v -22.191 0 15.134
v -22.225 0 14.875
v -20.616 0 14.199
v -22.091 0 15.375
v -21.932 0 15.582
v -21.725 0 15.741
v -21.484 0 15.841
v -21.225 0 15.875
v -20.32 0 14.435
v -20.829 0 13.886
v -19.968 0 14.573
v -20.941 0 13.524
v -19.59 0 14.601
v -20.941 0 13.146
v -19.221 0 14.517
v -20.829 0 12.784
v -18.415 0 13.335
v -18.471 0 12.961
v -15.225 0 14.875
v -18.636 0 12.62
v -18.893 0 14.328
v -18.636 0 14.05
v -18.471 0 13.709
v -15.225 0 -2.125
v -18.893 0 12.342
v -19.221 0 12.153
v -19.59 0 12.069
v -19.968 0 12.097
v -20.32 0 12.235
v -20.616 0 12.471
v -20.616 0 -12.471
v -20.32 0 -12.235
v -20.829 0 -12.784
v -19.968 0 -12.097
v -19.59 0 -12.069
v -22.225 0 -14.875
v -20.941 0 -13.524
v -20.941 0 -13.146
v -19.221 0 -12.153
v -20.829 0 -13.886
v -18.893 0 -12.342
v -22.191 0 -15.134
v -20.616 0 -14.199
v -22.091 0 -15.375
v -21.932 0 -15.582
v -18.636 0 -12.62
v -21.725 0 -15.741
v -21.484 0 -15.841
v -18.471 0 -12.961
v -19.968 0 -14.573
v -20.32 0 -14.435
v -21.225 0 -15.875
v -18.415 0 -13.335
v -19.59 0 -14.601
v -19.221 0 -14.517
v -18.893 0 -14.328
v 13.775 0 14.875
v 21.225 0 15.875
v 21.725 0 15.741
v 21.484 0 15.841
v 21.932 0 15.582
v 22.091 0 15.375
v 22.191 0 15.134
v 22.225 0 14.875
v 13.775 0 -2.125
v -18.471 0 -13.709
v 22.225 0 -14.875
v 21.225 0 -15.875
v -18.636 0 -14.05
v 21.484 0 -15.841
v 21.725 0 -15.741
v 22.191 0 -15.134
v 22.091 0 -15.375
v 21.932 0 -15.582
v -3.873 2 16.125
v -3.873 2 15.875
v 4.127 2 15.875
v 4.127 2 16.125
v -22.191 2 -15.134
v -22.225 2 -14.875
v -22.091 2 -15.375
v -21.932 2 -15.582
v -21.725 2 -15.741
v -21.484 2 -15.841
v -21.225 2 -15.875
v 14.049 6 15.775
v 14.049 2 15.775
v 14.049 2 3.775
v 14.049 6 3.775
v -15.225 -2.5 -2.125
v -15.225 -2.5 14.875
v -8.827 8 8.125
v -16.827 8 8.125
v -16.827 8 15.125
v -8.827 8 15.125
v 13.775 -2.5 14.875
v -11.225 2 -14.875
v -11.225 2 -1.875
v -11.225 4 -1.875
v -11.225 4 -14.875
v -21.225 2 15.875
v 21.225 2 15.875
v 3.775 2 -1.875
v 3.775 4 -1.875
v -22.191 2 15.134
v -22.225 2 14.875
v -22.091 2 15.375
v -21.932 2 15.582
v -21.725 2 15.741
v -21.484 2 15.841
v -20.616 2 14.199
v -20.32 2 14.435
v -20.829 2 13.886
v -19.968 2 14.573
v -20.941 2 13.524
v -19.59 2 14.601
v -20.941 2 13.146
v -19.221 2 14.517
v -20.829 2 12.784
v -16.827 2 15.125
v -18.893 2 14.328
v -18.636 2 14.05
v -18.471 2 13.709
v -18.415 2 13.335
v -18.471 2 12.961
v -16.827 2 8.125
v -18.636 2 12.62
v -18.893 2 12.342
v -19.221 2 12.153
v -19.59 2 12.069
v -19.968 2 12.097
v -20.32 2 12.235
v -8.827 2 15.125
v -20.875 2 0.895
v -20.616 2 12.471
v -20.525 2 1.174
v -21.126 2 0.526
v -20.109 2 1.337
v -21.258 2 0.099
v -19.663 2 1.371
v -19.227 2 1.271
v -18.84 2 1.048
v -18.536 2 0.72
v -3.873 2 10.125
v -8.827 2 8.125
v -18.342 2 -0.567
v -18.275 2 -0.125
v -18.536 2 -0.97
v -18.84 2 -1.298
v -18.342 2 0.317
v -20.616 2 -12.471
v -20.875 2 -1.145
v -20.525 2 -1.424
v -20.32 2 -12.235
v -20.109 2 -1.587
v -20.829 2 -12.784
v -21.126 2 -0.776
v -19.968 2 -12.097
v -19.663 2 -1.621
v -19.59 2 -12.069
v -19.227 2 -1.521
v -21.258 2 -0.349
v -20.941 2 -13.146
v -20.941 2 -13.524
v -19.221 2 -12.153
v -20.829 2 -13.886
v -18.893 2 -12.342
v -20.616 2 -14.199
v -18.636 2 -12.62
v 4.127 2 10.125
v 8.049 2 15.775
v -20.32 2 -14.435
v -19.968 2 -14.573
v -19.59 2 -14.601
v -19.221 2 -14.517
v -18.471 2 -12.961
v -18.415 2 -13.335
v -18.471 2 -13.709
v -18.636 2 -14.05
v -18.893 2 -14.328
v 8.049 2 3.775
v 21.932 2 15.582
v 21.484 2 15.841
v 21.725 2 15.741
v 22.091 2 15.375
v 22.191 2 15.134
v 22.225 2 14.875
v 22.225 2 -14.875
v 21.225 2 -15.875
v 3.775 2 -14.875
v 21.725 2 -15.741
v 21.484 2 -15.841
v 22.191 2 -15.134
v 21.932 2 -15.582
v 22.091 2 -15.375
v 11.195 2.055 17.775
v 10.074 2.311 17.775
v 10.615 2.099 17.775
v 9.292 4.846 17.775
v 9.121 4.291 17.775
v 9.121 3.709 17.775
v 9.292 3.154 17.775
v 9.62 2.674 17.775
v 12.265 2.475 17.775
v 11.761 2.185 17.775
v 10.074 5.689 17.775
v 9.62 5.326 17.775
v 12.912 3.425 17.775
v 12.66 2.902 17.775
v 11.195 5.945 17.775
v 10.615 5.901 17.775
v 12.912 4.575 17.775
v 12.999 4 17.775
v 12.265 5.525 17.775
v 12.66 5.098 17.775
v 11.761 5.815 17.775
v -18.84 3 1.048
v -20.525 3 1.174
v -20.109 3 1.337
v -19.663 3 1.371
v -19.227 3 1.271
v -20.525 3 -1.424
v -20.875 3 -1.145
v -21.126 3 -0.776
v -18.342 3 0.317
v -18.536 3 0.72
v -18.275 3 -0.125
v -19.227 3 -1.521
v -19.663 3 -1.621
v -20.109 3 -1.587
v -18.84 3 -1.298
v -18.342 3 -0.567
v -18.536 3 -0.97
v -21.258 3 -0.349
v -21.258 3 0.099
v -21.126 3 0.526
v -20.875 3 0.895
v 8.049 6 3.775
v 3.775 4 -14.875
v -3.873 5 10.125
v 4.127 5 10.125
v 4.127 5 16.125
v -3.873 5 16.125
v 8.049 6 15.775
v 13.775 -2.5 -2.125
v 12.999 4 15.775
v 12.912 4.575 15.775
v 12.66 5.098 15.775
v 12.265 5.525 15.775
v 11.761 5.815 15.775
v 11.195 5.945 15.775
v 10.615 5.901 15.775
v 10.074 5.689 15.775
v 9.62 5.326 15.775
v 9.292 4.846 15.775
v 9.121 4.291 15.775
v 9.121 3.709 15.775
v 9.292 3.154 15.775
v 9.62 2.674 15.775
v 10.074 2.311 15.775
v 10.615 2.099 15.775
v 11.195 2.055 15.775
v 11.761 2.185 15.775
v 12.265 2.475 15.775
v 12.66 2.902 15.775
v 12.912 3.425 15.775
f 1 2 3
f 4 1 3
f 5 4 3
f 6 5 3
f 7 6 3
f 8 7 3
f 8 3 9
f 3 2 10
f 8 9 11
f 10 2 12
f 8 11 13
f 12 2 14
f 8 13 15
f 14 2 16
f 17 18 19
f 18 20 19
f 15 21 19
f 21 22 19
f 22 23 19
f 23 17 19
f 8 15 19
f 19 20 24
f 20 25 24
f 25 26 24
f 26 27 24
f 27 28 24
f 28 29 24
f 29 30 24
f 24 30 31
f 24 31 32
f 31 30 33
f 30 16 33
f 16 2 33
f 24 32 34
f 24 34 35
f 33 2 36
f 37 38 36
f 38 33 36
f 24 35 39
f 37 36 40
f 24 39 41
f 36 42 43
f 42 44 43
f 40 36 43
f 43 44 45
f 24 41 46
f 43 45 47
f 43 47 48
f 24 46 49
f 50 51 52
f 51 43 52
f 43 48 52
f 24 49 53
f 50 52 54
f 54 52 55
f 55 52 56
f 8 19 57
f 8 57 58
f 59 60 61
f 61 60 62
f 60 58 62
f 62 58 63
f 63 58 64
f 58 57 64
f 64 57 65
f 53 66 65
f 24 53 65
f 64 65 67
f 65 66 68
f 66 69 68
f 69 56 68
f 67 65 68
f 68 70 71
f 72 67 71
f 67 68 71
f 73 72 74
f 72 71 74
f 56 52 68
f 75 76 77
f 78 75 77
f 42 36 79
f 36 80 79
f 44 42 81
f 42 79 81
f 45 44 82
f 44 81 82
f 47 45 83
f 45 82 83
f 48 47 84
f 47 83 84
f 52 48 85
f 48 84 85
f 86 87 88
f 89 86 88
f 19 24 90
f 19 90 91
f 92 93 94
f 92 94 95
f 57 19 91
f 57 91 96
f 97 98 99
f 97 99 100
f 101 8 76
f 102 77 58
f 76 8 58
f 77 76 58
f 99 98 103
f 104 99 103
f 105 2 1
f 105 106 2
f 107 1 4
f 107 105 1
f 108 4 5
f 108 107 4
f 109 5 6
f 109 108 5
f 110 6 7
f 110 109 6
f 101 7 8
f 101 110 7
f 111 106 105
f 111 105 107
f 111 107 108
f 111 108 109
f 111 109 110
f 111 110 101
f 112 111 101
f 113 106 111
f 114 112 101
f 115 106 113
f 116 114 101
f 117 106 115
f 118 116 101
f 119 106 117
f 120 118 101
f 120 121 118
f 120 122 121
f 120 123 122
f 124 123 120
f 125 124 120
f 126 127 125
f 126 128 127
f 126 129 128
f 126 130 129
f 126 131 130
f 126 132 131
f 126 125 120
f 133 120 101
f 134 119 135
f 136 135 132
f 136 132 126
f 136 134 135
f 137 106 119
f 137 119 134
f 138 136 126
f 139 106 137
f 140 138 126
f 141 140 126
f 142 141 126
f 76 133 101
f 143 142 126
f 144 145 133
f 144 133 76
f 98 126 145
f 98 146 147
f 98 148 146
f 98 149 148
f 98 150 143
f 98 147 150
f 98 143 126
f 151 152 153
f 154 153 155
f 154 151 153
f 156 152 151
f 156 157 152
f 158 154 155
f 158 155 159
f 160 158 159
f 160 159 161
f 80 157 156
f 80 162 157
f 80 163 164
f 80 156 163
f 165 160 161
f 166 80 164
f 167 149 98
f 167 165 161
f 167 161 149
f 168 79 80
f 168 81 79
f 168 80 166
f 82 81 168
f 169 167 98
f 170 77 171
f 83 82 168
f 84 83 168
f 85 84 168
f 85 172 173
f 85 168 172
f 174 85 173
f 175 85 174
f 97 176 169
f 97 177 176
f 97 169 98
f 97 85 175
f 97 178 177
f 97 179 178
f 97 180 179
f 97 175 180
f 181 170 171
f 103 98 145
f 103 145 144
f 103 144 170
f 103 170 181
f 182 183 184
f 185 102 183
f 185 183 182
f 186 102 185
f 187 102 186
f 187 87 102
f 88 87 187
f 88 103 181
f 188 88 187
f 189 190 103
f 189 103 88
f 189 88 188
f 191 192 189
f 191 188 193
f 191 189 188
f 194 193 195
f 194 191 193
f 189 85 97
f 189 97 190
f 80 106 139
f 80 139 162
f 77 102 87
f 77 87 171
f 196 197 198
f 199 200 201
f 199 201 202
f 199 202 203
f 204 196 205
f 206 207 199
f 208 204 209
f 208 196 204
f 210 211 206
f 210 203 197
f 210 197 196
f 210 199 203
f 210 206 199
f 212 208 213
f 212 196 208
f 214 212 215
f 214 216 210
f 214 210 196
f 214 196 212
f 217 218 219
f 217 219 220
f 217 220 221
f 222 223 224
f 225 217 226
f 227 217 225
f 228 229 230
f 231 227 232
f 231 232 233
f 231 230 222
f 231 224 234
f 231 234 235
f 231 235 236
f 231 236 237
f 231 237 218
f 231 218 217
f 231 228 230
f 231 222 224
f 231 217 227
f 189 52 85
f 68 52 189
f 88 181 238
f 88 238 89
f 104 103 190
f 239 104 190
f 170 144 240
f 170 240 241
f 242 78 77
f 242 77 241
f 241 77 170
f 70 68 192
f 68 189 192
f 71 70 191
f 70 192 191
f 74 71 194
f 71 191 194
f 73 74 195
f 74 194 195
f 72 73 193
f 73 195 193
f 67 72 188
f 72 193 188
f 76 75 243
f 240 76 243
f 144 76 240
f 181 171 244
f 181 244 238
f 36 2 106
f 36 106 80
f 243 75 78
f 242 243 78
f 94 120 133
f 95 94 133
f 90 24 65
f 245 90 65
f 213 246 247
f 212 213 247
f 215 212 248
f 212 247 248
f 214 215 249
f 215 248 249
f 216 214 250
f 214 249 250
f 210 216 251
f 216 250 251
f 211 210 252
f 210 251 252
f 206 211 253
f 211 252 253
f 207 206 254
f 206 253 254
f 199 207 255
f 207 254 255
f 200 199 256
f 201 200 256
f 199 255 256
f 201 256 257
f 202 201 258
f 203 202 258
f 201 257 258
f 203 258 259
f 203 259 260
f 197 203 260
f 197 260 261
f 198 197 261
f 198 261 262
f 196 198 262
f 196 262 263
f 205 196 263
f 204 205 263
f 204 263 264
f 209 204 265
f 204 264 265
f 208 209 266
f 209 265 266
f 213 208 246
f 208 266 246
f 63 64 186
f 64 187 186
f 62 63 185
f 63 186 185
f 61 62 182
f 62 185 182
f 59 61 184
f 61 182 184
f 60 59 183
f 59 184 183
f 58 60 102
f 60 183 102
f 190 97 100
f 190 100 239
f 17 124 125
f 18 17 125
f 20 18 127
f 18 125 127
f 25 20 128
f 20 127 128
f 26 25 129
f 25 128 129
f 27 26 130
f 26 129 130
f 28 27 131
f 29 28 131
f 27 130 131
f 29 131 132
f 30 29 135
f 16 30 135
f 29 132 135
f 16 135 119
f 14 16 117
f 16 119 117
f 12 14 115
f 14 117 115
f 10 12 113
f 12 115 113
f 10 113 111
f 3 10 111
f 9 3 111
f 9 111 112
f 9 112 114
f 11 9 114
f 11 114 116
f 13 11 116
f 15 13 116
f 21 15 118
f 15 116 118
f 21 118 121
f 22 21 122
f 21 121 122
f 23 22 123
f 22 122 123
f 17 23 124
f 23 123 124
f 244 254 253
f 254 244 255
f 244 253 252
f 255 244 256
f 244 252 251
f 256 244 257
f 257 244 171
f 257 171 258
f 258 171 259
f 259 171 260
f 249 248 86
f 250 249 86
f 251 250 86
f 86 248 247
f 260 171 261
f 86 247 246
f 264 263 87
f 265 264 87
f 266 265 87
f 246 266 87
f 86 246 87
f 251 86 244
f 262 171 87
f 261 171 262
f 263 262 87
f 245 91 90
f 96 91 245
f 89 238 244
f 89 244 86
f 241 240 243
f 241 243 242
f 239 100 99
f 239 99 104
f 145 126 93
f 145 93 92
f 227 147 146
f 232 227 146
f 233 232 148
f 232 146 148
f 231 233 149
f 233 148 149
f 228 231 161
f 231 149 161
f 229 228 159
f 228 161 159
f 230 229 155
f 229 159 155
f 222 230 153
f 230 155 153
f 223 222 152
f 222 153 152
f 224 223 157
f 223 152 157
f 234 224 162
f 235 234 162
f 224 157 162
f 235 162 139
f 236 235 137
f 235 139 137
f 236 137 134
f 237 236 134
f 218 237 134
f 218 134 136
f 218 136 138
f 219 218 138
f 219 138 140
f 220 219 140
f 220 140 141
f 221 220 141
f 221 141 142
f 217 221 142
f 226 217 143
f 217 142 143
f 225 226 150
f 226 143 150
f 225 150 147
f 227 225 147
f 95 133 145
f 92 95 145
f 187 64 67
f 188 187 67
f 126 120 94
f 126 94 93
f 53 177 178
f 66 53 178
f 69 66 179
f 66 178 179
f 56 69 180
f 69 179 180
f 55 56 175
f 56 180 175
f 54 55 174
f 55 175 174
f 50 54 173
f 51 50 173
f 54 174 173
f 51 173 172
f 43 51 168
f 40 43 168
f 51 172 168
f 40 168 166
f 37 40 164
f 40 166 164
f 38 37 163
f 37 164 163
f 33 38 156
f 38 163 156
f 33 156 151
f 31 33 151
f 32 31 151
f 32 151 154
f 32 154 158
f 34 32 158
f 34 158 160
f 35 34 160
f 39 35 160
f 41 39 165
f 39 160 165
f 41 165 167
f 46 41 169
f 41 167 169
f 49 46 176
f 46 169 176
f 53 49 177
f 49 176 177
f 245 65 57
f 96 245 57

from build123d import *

# Parameters (mm, degrees)
SKETCH1_W           = 44.45
SKETCH1_H           = 31.75
BOSS_EXTRUDE1_DEPTH = 2
SKETCH2_R           = 1.27
CUT_EXTRUDE1_DEPTH  = 2
FILLET1_R           = 1
FILLET2_R           = 1
FILLET3_R           = 1
FILLET4_R           = 1
SKETCH3_W           = 8
SKETCH3_H           = 7
BOSS_EXTRUDE2_DEPTH = 6
SKETCH4_W           = 8
SKETCH4_H           = 6
BOSS_EXTRUDE3_DEPTH = 3
SKETCH5_W           = 6
SKETCH5_H           = 12
BOSS_EXTRUDE4_DEPTH = 4
SKETCH6_R           = 1.95
BOSS_EXTRUDE5_DEPTH = 2
SKETCH7_R           = 1.5
BOSS_EXTRUDE6_DEPTH = 1
SKETCH9_W           = 15
SKETCH9_H           = 13
BOSS_EXTRUDE7_DEPTH = 2
SKETCH10_W          = 29
SKETCH10_H          = 17
BOSS_EXTRUDE8_DEPTH = 2.5


with BuildPart() as part:
    # Sketch1 → Boss-Extrude1 (new body)
    with BuildSketch(Plane(origin=(0, 0, 0), x_dir=(1, 0, 0), z_dir=(0, 1, 0))):
        Rectangle(SKETCH1_W, SKETCH1_H)
    extrude(amount=BOSS_EXTRUDE1_DEPTH)

    # Sketch2 → Cut-Extrude1 (cut)
    with BuildSketch(Plane(origin=(0, 2, 0), x_dir=(1, 0, 0), z_dir=(0, 1, 0))):
        with Locations((-19.685, -13.335)):
            Circle(SKETCH2_R)
        with Locations((-19.685, 13.335)):
            Circle(SKETCH2_R)
    extrude(amount=-CUT_EXTRUDE1_DEPTH, mode=Mode.SUBTRACT)

    # Fillet1
    fillet1_edges = [part.edges().sort_by_distance(p)[0] for p in [
        (-22.225, 1, -15.875),
    ]]
    fillet(fillet1_edges, radius=FILLET1_R)

    # Fillet2
    fillet2_edges = [part.edges().sort_by_distance(p)[0] for p in [
        (-22.225, 1, 15.875),
    ]]
    fillet(fillet2_edges, radius=FILLET2_R)

    # Fillet3
    fillet3_edges = [part.edges().sort_by_distance(p)[0] for p in [
        (22.225, 1, -15.875),
    ]]
    fillet(fillet3_edges, radius=FILLET3_R)

    # Fillet4
    fillet4_edges = [part.edges().sort_by_distance(p)[0] for p in [
        (22.225, 1, 15.875),
    ]]
    fillet(fillet4_edges, radius=FILLET4_R)

    # Sketch3 → Boss-Extrude2 (add)
    with BuildSketch(Plane(origin=(0, 2, 0), x_dir=(1, 0, 0), z_dir=(0, 1, 0))):
        with Locations((-12.827, -11.625)):
            Rectangle(SKETCH3_W, SKETCH3_H)
    extrude(amount=BOSS_EXTRUDE2_DEPTH)

    # Sketch4 → Boss-Extrude3 (add)
    with BuildSketch(Plane(origin=(0, 2, 0), x_dir=(1, 0, 0), z_dir=(0, 1, 0))):
        with Locations((0.127, -13.125)):
            Rectangle(SKETCH4_W, SKETCH4_H)
    extrude(amount=BOSS_EXTRUDE3_DEPTH)

    # Sketch5 → Boss-Extrude4 (add)
    with BuildSketch(Plane(origin=(0, 2, 0), x_dir=(1, 0, 0), z_dir=(0, 1, 0))):
        with Locations((11.049, -9.775)):
            Rectangle(SKETCH5_W, SKETCH5_H)
    extrude(amount=BOSS_EXTRUDE4_DEPTH)

    # Sketch6 → Boss-Extrude5 (add)
    with BuildSketch(Plane.XY.offset(15.775)):
        with Locations((11.049, 4)):
            Circle(SKETCH6_R)
    extrude(amount=BOSS_EXTRUDE5_DEPTH)

    # Sketch7 → Boss-Extrude6 (add)
    with BuildSketch(Plane(origin=(0, 2, 0), x_dir=(1, 0, 0), z_dir=(0, 1, 0))):
        with Locations((-19.775, 0.125)):
            Circle(SKETCH7_R)
    extrude(amount=BOSS_EXTRUDE6_DEPTH)

    # Sketch9 → Boss-Extrude7 (add)
    with BuildSketch(Plane(origin=(0, 2, 0), x_dir=(1, 0, 0), z_dir=(0, 1, 0))):
        with Locations((-3.725, 8.375)):
            Rectangle(SKETCH9_W, SKETCH9_H)
    extrude(amount=BOSS_EXTRUDE7_DEPTH)

    # Sketch10 → Boss-Extrude8 (add)
    with BuildSketch(Plane.XZ):
        with Locations((-0.725, 6.375)):
            Rectangle(SKETCH10_W, SKETCH10_H)
    extrude(amount=BOSS_EXTRUDE8_DEPTH)


solid = part.part
